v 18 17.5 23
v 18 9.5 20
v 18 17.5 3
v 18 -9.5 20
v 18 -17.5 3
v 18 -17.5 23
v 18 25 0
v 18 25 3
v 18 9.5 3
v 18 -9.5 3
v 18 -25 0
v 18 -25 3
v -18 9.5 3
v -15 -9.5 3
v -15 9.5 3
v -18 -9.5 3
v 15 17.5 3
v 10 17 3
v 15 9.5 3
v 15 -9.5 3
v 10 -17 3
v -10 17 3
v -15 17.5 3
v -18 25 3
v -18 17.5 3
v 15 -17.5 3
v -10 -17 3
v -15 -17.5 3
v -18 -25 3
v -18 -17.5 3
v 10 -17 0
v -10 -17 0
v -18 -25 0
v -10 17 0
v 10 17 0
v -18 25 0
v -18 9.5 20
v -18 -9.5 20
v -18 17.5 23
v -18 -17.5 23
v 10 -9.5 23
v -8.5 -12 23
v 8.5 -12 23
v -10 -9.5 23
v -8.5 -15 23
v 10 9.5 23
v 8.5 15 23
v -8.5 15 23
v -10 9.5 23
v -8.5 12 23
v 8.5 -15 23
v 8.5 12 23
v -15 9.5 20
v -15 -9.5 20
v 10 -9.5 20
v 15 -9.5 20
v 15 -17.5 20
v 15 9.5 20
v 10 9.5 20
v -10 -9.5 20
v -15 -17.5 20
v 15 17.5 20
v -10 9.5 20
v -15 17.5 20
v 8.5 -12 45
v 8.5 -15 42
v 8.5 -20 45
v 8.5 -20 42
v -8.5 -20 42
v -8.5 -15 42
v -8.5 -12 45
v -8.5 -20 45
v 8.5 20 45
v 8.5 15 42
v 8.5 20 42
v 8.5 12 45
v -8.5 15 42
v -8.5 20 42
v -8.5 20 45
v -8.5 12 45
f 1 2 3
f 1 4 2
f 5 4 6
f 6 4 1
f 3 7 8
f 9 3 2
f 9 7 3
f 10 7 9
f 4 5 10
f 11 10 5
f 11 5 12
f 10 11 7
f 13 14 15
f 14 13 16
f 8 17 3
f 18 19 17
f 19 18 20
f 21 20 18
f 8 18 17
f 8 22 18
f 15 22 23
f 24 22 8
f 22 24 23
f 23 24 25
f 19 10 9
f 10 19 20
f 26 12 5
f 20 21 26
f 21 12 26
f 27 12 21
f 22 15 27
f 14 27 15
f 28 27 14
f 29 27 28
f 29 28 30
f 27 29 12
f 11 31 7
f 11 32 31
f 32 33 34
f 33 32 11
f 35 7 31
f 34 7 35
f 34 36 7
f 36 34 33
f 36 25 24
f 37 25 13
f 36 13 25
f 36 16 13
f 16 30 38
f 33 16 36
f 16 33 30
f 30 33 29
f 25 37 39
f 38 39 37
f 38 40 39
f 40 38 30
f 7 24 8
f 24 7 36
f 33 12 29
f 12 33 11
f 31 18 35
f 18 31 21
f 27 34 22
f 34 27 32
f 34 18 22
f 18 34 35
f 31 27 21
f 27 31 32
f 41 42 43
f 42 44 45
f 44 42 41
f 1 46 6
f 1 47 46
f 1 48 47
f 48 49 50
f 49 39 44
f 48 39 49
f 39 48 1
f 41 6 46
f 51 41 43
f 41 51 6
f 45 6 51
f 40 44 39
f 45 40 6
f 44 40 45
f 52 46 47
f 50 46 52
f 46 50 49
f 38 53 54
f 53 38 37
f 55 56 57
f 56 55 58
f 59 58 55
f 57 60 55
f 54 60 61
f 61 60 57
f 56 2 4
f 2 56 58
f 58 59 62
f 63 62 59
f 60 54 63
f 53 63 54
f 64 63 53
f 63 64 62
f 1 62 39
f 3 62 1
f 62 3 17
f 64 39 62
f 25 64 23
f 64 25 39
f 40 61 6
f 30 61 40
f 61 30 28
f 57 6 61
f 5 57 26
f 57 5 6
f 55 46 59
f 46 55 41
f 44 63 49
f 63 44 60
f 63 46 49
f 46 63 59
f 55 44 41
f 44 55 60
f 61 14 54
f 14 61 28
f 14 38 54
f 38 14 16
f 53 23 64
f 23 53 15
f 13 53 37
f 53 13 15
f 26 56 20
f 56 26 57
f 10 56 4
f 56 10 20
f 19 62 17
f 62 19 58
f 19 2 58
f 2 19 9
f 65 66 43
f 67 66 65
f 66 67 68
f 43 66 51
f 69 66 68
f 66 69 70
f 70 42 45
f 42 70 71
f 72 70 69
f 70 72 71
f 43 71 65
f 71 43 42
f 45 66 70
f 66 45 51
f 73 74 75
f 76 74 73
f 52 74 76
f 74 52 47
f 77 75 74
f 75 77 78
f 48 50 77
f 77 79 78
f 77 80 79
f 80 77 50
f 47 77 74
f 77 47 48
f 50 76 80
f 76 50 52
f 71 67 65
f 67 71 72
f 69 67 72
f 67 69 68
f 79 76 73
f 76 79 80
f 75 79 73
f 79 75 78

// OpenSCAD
/*
 Hanger for the CFA Tait portable.  Designed to fit in the
 vent of the car/ute.

 Fill: 50% Hex
*/
VentOpening = 30; /* How far apart the clip into the vent needs to be */
VentWidth = 17; /* Max width of internal part of vent */
VentDepth = 19; /* How far we can hang over the vent */
VentHeight = 8; /* How high the spacing between louvres is */
RadioWidth = 30; /* Width of clip on the radio is */
RadioDepth = 17; /* Depth of the clip */
RadioLength = 50; /* How long we want the clip to cover */
Width = 3; /* The width of support structures */
VentSpacing = VentOpening - Width;


/* We need to create a baseplate which is where the clip comes in */
translate([-1*(RadioWidth/2+Width),-1*(RadioLength/2),0]) {
  difference() {
    cube([RadioWidth+2*Width, RadioLength, Width]);
    translate([VentHeight, VentHeight,0]) {
      cube([RadioWidth+2*Width-2*VentHeight, RadioLength-2*VentHeight, Width]);
    }
  }
}

/* Create the clip holder by having an offset wall */
translate([-1*(RadioWidth/2+Width),-1*(VentSpacing/2+VentHeight/2), Width]) {
  cube([Width, VentHeight,RadioDepth]);
}
translate([-1*(RadioWidth/2+Width),VentSpacing/2-VentHeight/2, Width]) {
  cube([Width, VentHeight, RadioDepth]);
}
translate([RadioWidth/2,-1*(VentSpacing/2+VentHeight/2), Width]) {
  cube([Width, VentHeight,RadioDepth]);
}
translate([RadioWidth/2,VentSpacing/2-VentHeight/2, Width]) {
  cube([Width, VentHeight, RadioDepth]);
}
/* Now we need to create the back plates */
translate([-1*(RadioWidth/2+Width),-1*(VentSpacing/2+VentHeight/2), Width+RadioDepth]) {
    difference() {
        cube([RadioWidth+2*Width, VentSpacing+VentHeight,Width]);
        translate([VentHeight,VentHeight,0]){
          cube([RadioWidth+2*Width-2*VentHeight,VentSpacing-VentHeight,Width]);
        }
    }
}

/* The standoffs */
translate([-1*VentWidth/2,-1*(VentSpacing/2+Width/2),Width*2+RadioDepth]) {
  cube([VentWidth, Width, VentDepth]);
}
translate([-1*VentWidth/2,VentSpacing/2-Width/2,Width*2+RadioDepth]) {
  cube([VentWidth, Width, VentDepth]);
}

/* The clippy bits on the standoffs */
translate([-1*VentWidth/2,-1*(VentSpacing/2-Width/2+VentHeight),Width*2+RadioDepth+VentDepth]) {
  cube([VentWidth, VentHeight, Width]);
}
translate([-1*VentWidth/2,VentSpacing/2-Width/2,Width*2+RadioDepth+VentDepth]) {
  cube([VentWidth, VentHeight, Width]);
}
